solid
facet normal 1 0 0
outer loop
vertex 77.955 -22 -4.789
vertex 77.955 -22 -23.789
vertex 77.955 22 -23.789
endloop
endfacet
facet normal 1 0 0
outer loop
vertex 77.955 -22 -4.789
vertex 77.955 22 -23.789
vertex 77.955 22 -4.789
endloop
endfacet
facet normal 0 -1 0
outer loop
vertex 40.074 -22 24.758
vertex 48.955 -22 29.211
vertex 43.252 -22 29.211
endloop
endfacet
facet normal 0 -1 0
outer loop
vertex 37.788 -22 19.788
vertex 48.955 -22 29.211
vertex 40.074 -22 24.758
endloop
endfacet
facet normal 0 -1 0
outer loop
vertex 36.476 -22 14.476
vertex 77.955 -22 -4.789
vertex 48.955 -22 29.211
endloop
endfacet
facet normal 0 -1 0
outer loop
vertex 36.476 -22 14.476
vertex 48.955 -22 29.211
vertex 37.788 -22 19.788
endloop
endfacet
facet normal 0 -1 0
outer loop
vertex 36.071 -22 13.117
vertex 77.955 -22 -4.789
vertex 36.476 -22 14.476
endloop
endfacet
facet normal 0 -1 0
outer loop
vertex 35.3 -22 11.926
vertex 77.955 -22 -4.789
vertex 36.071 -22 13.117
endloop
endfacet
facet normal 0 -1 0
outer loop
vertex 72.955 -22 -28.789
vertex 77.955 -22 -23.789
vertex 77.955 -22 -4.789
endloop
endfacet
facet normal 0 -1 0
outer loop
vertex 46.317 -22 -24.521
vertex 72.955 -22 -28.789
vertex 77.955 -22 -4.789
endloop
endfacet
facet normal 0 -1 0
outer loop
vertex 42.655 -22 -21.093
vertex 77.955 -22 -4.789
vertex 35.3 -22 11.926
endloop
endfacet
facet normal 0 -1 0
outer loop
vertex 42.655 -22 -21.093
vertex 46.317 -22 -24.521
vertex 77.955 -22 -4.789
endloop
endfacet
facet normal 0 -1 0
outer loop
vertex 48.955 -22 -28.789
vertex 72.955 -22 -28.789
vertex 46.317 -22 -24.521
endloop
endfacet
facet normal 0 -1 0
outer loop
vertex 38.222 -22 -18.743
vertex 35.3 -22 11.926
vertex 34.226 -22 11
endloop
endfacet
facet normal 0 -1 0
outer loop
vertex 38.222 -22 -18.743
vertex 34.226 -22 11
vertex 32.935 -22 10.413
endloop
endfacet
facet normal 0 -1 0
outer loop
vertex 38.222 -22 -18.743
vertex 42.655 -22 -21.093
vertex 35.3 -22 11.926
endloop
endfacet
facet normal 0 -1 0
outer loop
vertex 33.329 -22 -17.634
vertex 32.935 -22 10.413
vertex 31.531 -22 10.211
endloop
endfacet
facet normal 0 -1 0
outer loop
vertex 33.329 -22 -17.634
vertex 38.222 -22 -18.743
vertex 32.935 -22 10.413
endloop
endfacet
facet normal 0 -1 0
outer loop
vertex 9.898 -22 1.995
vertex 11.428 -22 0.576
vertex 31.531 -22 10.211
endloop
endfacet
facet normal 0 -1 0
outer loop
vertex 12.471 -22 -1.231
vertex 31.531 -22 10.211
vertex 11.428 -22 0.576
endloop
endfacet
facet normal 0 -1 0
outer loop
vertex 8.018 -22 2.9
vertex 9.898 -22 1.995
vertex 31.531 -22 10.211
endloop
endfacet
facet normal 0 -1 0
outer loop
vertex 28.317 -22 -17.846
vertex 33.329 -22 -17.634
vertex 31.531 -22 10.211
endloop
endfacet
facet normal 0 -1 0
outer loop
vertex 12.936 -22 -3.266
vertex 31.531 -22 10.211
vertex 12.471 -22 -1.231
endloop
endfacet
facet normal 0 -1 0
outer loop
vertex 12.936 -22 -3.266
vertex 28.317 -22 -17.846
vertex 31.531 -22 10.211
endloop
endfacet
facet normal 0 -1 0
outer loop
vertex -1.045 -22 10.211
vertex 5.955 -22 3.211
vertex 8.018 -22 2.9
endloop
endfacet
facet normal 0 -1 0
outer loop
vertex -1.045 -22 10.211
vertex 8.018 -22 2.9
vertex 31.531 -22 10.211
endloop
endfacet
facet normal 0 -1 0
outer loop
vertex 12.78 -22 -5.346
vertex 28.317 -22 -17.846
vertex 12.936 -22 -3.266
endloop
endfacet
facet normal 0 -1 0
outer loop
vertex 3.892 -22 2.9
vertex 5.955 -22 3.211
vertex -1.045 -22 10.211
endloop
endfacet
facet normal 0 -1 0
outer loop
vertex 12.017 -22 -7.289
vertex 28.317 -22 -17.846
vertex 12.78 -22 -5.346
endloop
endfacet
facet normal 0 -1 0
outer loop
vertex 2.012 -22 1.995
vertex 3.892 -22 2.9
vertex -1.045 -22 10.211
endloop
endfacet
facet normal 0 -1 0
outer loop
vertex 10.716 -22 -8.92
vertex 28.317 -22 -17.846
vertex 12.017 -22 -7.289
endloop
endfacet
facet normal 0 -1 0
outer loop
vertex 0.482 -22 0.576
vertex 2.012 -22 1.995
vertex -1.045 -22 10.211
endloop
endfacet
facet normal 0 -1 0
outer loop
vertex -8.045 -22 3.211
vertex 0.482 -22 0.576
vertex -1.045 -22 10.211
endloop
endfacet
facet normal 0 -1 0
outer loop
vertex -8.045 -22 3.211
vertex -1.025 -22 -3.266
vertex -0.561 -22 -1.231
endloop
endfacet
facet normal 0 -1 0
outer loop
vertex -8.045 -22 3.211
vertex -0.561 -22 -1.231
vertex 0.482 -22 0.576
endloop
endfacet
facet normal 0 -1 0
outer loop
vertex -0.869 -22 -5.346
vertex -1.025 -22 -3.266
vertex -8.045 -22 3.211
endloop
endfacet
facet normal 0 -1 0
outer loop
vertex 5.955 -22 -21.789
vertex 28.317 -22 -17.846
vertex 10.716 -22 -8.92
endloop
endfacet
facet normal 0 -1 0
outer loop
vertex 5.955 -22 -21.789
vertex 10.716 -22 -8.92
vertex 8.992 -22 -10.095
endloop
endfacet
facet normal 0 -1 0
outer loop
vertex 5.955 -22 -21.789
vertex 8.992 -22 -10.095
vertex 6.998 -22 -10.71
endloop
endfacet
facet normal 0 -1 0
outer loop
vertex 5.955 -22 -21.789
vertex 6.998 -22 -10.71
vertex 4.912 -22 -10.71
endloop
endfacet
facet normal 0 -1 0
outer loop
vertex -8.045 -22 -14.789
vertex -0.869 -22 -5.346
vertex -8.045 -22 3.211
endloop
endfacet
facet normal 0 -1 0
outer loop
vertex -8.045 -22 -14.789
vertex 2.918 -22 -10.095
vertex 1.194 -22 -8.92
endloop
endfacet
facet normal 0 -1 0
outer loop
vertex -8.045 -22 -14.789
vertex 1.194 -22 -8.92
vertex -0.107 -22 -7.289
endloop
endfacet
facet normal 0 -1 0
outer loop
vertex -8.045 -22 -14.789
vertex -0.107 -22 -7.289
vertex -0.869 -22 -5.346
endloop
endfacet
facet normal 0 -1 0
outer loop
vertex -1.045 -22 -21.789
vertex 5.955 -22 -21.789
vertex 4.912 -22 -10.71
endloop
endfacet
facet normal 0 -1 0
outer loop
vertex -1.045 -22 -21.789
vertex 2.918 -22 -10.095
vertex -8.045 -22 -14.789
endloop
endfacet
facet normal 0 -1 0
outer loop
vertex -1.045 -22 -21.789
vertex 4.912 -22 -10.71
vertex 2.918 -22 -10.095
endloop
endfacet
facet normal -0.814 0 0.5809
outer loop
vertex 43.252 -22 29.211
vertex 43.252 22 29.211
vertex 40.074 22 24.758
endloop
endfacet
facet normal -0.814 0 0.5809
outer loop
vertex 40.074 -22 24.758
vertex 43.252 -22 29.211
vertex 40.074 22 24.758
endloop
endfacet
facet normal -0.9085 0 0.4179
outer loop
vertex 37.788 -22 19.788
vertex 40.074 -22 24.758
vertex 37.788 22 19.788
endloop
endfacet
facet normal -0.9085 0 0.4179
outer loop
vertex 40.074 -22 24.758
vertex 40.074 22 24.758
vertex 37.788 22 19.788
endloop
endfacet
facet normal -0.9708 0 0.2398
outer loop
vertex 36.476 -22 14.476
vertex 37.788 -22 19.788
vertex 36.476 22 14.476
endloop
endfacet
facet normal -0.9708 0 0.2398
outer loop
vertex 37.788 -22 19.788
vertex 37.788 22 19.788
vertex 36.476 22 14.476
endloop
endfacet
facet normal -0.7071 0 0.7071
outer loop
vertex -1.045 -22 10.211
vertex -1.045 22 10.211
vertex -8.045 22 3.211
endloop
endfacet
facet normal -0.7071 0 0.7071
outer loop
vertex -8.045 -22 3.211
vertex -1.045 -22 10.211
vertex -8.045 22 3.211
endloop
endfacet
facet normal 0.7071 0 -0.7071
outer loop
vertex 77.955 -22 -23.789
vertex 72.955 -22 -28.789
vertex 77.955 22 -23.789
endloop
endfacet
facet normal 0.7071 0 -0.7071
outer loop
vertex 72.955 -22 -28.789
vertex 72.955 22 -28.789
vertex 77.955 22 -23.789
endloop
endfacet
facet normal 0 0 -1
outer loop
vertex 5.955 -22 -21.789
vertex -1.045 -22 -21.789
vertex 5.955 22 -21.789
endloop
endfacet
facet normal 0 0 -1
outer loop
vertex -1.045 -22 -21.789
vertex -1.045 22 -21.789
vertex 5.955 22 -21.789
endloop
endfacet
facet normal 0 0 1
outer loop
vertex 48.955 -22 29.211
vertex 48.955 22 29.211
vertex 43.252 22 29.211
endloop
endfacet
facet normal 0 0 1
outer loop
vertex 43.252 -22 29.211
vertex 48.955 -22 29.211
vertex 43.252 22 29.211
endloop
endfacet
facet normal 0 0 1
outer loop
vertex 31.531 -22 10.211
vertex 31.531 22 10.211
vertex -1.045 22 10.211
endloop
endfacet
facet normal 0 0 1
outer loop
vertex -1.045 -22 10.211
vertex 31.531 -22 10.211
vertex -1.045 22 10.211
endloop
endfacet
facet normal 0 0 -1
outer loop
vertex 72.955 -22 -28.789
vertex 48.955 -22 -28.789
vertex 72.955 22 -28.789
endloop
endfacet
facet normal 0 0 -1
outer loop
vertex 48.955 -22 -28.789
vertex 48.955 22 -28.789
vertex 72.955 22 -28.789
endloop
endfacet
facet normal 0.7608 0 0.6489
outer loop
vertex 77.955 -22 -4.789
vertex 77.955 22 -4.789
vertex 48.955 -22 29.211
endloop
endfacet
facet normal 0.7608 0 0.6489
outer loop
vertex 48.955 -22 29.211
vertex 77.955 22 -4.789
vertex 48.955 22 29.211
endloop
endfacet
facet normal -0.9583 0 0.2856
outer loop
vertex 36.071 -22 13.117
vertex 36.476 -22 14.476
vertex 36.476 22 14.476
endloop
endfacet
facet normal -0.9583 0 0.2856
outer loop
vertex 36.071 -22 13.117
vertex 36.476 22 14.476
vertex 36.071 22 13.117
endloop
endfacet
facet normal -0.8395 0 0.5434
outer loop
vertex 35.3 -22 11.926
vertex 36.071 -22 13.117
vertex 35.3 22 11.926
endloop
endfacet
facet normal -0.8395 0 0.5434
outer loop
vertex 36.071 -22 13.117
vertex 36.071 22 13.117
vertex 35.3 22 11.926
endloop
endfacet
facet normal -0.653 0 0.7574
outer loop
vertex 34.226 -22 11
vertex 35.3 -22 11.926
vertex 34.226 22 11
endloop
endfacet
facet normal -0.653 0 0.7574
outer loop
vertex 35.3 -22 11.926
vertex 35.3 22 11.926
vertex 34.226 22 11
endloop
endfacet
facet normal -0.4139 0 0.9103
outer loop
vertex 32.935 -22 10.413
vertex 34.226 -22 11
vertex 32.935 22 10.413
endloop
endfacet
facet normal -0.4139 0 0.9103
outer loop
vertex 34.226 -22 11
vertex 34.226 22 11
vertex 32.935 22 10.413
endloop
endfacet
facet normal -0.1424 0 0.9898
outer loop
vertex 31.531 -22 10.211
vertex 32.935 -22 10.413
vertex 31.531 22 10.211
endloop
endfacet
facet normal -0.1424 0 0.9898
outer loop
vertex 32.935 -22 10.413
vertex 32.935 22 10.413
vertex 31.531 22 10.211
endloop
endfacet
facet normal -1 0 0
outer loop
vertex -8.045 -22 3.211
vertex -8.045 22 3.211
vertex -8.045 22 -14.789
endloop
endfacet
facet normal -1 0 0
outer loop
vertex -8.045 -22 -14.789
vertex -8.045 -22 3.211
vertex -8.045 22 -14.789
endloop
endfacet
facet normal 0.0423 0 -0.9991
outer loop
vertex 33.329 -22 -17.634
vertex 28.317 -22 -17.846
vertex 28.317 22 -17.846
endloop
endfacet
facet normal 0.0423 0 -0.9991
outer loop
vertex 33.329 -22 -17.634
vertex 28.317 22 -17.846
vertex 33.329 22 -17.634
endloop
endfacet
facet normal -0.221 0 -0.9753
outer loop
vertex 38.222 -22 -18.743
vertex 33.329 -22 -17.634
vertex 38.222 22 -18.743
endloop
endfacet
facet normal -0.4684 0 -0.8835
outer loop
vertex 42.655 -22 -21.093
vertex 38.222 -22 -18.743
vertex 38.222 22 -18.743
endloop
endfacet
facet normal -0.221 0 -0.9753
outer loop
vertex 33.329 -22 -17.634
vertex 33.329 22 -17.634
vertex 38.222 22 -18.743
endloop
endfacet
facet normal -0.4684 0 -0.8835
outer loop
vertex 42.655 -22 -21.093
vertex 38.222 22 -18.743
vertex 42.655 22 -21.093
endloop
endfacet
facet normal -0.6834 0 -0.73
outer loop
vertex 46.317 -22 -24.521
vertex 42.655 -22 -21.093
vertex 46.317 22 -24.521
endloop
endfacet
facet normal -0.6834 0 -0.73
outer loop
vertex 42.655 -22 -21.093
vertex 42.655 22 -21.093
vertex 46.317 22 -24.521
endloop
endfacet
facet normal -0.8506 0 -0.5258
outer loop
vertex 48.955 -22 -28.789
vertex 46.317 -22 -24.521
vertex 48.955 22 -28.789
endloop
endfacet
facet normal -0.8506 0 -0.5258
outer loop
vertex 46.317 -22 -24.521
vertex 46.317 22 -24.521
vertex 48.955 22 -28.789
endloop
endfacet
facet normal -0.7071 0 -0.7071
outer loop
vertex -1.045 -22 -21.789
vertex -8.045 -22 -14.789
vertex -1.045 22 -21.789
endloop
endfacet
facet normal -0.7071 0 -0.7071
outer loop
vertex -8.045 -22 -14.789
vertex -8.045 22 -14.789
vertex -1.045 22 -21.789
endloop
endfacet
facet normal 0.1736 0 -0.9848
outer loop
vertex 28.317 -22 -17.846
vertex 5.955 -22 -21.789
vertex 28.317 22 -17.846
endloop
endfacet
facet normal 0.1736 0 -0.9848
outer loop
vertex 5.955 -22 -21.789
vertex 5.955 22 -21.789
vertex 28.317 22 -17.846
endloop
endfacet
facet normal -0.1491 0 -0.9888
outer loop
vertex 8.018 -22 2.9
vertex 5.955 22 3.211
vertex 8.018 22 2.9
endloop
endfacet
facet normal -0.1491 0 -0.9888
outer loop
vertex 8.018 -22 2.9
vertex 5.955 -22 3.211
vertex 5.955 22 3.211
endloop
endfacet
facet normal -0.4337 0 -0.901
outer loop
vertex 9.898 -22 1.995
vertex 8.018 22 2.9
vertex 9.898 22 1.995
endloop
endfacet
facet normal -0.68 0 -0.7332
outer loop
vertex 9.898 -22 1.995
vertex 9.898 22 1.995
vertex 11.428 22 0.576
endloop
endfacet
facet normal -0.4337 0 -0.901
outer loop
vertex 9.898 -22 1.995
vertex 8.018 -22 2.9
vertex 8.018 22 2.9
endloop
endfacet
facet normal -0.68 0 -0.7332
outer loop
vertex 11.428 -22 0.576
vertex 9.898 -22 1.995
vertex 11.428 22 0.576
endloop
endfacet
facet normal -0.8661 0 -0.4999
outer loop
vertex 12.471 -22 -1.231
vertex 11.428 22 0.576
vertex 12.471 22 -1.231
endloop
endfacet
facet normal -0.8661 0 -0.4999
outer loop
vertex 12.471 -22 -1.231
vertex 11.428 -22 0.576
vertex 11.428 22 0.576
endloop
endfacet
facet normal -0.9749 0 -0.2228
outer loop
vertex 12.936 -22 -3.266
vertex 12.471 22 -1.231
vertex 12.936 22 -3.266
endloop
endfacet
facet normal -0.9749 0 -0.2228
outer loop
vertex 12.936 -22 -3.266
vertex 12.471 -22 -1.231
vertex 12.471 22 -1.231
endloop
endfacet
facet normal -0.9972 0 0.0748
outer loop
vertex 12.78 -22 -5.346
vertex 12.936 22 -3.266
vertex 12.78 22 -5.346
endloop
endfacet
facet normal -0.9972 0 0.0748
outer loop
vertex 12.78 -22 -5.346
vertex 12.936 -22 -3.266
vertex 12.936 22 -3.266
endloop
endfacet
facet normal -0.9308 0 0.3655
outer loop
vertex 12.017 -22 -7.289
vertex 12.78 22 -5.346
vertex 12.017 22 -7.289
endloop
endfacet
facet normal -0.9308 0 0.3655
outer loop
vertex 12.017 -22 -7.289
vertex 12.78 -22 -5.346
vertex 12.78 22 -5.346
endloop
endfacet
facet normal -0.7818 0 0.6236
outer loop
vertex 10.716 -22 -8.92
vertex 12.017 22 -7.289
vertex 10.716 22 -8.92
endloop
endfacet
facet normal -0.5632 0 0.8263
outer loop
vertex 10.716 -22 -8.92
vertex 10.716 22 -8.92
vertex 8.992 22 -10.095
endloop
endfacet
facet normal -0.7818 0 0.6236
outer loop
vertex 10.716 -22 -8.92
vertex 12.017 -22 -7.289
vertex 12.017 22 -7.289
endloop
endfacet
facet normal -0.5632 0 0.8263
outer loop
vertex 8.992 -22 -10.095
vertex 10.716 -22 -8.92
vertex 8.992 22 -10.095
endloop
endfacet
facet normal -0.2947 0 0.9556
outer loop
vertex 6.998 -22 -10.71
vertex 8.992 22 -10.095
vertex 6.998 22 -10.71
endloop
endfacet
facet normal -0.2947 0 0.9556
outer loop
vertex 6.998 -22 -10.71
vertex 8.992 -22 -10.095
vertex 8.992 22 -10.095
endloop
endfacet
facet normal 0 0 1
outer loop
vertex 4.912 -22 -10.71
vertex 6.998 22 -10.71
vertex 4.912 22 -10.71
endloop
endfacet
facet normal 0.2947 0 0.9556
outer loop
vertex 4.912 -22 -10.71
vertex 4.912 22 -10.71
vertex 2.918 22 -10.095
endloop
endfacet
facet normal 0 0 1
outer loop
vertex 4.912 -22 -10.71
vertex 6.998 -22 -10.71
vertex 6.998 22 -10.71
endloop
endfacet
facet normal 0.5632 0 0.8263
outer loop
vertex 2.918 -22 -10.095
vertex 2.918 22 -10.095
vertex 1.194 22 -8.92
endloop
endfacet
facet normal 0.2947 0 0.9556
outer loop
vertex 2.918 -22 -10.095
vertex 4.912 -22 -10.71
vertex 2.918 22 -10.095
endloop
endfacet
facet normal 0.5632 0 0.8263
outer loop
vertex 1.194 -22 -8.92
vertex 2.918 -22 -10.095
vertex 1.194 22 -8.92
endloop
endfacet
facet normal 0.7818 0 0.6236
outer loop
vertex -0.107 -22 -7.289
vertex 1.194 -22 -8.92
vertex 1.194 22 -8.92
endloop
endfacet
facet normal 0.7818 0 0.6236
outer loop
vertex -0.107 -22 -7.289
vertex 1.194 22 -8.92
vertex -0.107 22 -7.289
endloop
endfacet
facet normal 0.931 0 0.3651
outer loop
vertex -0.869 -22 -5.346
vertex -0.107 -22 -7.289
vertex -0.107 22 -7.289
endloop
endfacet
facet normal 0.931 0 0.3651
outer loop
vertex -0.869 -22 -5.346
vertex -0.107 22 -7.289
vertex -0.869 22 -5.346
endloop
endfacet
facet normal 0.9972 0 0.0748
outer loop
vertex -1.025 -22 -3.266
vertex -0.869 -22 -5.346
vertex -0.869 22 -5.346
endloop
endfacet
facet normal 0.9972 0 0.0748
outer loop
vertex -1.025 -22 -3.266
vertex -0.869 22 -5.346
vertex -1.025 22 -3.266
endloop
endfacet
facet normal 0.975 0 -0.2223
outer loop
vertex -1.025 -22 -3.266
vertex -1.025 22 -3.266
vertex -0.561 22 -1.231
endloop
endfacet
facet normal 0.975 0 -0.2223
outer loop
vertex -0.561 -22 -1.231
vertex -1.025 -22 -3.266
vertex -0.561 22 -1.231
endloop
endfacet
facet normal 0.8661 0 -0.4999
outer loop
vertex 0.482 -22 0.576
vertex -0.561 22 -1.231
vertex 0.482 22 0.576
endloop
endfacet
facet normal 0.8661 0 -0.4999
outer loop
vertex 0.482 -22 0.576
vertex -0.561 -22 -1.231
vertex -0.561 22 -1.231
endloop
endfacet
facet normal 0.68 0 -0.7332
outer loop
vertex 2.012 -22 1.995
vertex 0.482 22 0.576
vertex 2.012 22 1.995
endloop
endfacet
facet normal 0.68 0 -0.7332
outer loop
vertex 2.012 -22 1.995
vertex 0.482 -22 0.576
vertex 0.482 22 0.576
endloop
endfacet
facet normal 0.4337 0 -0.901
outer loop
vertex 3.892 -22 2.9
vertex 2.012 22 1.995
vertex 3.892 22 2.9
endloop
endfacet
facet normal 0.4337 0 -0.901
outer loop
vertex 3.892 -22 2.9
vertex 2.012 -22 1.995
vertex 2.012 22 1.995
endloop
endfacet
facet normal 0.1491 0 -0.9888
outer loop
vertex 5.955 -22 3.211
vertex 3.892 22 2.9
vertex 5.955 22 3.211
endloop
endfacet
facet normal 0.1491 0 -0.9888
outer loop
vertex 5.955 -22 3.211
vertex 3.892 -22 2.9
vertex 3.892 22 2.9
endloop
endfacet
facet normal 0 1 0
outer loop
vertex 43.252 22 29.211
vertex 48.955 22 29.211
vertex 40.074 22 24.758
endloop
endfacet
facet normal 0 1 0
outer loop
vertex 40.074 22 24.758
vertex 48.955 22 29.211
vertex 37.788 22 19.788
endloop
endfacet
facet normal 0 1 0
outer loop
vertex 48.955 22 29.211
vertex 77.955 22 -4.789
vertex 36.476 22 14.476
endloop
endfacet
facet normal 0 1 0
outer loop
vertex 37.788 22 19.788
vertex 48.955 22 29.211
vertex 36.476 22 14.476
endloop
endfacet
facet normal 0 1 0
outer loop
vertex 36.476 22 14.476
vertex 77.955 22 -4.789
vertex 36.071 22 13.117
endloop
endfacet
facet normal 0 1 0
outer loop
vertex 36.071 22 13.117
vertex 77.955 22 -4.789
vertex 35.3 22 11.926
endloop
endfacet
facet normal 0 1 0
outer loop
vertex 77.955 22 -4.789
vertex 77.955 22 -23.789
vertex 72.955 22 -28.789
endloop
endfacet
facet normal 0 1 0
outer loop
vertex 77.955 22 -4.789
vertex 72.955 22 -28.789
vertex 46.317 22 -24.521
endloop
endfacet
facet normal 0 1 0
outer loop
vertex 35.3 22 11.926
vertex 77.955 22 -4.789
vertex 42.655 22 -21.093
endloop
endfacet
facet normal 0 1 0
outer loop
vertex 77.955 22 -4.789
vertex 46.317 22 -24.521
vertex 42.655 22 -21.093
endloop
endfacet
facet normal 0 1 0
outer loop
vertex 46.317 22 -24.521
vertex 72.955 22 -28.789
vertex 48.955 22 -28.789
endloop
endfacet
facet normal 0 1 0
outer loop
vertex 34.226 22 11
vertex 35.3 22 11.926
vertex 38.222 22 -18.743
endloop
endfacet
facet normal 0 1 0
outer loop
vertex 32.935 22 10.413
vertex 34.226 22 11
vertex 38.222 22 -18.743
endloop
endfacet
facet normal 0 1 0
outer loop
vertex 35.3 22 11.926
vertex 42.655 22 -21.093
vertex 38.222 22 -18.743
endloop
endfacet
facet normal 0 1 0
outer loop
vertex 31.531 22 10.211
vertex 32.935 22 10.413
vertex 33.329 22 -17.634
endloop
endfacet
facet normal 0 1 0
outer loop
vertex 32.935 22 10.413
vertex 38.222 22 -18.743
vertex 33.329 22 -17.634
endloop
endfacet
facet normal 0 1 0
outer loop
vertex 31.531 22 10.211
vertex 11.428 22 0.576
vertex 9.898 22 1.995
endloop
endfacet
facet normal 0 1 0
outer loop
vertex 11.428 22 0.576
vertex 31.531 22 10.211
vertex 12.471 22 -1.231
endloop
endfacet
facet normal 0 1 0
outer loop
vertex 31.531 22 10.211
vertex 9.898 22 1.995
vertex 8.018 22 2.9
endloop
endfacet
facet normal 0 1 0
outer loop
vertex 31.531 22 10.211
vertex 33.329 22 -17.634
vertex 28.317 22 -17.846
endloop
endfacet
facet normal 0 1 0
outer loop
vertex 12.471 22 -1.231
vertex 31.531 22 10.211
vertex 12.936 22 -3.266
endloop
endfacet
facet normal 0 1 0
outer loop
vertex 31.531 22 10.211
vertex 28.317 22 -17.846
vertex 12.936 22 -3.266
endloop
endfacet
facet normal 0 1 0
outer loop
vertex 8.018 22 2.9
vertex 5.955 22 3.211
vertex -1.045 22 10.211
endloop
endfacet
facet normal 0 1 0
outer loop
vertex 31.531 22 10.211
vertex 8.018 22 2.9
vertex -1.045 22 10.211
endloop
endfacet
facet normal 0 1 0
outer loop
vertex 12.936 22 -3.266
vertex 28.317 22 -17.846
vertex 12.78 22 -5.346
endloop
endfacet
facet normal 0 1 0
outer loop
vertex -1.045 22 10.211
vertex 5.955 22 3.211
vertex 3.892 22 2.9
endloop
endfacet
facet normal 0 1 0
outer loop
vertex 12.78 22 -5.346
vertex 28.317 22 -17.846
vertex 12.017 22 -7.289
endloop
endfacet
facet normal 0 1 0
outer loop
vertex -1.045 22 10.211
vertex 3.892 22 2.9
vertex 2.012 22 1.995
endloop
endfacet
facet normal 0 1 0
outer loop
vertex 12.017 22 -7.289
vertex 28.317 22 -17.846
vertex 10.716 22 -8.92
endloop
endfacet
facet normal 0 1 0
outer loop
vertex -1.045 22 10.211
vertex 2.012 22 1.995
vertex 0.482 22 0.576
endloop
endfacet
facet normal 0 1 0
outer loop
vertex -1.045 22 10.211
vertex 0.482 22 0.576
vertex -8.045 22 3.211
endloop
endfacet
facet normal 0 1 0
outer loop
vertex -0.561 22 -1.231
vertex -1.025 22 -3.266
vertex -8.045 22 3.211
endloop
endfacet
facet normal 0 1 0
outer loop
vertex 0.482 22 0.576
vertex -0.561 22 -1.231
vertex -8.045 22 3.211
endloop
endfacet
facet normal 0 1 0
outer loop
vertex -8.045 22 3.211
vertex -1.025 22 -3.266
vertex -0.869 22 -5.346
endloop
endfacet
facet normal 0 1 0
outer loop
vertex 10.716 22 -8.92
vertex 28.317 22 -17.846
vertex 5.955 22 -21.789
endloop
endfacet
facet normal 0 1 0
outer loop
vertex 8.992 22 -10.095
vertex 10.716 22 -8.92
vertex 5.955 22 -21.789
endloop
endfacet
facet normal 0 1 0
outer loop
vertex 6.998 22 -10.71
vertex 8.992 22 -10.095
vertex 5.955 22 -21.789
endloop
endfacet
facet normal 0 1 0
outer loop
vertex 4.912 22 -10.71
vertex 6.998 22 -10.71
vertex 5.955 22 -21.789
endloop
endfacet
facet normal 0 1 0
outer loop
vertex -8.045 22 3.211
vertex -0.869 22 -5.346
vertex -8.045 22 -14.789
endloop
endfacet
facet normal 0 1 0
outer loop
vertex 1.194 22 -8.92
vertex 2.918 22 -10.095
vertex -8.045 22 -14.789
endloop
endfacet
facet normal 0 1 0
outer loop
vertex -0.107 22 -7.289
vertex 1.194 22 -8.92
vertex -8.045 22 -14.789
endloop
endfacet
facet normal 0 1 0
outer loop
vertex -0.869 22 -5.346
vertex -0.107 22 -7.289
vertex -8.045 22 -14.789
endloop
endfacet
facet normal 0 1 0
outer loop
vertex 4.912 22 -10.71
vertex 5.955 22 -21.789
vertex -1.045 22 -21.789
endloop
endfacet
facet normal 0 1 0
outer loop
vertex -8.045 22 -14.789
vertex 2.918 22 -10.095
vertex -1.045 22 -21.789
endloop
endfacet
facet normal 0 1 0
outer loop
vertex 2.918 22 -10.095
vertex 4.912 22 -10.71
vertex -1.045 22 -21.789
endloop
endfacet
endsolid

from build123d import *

# Parameters (mm, degrees)
SKETCH2_R           = 7
BOSS_EXTRUDE1_DEPTH = 22


with BuildPart() as part:
    # Sketch2 → Boss-Extrude1 (new, symmetric)
    with BuildSketch(Plane(origin=(0, 0, 0), x_dir=(1, 0, 0), z_dir=(0, 1, 0))):
        with BuildLine():
            Line((-8.044825261, -3.211346175), (-8.044825261, 14.788653825))
            Line((-8.044825261, 14.788653825), (-1.044825261, 21.788653825))
            Line((-1.044825261, 21.788653825), (5.955174739, 21.788653825))
            Line((5.955174739, 21.788653825), (28.316555575, 17.845739058))
            ThreePointArc((28.316555575, 17.845739058), (40.516273445, 19.770697967), (48.955174739, 28.788653825))
            Line((48.955174739, 28.788653825), (72.955174739, 28.788653825))
            Line((72.955174739, 28.788653825), (77.955174739, 23.788653825))
            Line((77.955174739, 23.788653825), (77.955174739, 4.788653825))
            Line((77.955174739, 4.788653825), (48.955174739, -29.211346175))
            Line((48.955174739, -29.211346175), (43.252154792, -29.211346175))
            ThreePointArc((43.252154792, -29.211346175), (38.813182595, -22.327018236), (36.476352392, -14.476052057))
            ThreePointArc((36.476352392, -14.476052057), (34.795949432, -11.424759943), (31.530713651, -10.211346175))
            Line((31.530713651, -10.211346175), (-1.044825261, -10.211346175))
            Line((-1.044825261, -10.211346175), (-8.044825261, -3.211346175))
        make_face()
        with Locations(Location((5.955174739, 3.788653825, 0), (0, 0, 270))):
            Circle(SKETCH2_R, mode=Mode.SUBTRACT)
    extrude(amount=BOSS_EXTRUDE1_DEPTH, both=True)


solid = part.part
